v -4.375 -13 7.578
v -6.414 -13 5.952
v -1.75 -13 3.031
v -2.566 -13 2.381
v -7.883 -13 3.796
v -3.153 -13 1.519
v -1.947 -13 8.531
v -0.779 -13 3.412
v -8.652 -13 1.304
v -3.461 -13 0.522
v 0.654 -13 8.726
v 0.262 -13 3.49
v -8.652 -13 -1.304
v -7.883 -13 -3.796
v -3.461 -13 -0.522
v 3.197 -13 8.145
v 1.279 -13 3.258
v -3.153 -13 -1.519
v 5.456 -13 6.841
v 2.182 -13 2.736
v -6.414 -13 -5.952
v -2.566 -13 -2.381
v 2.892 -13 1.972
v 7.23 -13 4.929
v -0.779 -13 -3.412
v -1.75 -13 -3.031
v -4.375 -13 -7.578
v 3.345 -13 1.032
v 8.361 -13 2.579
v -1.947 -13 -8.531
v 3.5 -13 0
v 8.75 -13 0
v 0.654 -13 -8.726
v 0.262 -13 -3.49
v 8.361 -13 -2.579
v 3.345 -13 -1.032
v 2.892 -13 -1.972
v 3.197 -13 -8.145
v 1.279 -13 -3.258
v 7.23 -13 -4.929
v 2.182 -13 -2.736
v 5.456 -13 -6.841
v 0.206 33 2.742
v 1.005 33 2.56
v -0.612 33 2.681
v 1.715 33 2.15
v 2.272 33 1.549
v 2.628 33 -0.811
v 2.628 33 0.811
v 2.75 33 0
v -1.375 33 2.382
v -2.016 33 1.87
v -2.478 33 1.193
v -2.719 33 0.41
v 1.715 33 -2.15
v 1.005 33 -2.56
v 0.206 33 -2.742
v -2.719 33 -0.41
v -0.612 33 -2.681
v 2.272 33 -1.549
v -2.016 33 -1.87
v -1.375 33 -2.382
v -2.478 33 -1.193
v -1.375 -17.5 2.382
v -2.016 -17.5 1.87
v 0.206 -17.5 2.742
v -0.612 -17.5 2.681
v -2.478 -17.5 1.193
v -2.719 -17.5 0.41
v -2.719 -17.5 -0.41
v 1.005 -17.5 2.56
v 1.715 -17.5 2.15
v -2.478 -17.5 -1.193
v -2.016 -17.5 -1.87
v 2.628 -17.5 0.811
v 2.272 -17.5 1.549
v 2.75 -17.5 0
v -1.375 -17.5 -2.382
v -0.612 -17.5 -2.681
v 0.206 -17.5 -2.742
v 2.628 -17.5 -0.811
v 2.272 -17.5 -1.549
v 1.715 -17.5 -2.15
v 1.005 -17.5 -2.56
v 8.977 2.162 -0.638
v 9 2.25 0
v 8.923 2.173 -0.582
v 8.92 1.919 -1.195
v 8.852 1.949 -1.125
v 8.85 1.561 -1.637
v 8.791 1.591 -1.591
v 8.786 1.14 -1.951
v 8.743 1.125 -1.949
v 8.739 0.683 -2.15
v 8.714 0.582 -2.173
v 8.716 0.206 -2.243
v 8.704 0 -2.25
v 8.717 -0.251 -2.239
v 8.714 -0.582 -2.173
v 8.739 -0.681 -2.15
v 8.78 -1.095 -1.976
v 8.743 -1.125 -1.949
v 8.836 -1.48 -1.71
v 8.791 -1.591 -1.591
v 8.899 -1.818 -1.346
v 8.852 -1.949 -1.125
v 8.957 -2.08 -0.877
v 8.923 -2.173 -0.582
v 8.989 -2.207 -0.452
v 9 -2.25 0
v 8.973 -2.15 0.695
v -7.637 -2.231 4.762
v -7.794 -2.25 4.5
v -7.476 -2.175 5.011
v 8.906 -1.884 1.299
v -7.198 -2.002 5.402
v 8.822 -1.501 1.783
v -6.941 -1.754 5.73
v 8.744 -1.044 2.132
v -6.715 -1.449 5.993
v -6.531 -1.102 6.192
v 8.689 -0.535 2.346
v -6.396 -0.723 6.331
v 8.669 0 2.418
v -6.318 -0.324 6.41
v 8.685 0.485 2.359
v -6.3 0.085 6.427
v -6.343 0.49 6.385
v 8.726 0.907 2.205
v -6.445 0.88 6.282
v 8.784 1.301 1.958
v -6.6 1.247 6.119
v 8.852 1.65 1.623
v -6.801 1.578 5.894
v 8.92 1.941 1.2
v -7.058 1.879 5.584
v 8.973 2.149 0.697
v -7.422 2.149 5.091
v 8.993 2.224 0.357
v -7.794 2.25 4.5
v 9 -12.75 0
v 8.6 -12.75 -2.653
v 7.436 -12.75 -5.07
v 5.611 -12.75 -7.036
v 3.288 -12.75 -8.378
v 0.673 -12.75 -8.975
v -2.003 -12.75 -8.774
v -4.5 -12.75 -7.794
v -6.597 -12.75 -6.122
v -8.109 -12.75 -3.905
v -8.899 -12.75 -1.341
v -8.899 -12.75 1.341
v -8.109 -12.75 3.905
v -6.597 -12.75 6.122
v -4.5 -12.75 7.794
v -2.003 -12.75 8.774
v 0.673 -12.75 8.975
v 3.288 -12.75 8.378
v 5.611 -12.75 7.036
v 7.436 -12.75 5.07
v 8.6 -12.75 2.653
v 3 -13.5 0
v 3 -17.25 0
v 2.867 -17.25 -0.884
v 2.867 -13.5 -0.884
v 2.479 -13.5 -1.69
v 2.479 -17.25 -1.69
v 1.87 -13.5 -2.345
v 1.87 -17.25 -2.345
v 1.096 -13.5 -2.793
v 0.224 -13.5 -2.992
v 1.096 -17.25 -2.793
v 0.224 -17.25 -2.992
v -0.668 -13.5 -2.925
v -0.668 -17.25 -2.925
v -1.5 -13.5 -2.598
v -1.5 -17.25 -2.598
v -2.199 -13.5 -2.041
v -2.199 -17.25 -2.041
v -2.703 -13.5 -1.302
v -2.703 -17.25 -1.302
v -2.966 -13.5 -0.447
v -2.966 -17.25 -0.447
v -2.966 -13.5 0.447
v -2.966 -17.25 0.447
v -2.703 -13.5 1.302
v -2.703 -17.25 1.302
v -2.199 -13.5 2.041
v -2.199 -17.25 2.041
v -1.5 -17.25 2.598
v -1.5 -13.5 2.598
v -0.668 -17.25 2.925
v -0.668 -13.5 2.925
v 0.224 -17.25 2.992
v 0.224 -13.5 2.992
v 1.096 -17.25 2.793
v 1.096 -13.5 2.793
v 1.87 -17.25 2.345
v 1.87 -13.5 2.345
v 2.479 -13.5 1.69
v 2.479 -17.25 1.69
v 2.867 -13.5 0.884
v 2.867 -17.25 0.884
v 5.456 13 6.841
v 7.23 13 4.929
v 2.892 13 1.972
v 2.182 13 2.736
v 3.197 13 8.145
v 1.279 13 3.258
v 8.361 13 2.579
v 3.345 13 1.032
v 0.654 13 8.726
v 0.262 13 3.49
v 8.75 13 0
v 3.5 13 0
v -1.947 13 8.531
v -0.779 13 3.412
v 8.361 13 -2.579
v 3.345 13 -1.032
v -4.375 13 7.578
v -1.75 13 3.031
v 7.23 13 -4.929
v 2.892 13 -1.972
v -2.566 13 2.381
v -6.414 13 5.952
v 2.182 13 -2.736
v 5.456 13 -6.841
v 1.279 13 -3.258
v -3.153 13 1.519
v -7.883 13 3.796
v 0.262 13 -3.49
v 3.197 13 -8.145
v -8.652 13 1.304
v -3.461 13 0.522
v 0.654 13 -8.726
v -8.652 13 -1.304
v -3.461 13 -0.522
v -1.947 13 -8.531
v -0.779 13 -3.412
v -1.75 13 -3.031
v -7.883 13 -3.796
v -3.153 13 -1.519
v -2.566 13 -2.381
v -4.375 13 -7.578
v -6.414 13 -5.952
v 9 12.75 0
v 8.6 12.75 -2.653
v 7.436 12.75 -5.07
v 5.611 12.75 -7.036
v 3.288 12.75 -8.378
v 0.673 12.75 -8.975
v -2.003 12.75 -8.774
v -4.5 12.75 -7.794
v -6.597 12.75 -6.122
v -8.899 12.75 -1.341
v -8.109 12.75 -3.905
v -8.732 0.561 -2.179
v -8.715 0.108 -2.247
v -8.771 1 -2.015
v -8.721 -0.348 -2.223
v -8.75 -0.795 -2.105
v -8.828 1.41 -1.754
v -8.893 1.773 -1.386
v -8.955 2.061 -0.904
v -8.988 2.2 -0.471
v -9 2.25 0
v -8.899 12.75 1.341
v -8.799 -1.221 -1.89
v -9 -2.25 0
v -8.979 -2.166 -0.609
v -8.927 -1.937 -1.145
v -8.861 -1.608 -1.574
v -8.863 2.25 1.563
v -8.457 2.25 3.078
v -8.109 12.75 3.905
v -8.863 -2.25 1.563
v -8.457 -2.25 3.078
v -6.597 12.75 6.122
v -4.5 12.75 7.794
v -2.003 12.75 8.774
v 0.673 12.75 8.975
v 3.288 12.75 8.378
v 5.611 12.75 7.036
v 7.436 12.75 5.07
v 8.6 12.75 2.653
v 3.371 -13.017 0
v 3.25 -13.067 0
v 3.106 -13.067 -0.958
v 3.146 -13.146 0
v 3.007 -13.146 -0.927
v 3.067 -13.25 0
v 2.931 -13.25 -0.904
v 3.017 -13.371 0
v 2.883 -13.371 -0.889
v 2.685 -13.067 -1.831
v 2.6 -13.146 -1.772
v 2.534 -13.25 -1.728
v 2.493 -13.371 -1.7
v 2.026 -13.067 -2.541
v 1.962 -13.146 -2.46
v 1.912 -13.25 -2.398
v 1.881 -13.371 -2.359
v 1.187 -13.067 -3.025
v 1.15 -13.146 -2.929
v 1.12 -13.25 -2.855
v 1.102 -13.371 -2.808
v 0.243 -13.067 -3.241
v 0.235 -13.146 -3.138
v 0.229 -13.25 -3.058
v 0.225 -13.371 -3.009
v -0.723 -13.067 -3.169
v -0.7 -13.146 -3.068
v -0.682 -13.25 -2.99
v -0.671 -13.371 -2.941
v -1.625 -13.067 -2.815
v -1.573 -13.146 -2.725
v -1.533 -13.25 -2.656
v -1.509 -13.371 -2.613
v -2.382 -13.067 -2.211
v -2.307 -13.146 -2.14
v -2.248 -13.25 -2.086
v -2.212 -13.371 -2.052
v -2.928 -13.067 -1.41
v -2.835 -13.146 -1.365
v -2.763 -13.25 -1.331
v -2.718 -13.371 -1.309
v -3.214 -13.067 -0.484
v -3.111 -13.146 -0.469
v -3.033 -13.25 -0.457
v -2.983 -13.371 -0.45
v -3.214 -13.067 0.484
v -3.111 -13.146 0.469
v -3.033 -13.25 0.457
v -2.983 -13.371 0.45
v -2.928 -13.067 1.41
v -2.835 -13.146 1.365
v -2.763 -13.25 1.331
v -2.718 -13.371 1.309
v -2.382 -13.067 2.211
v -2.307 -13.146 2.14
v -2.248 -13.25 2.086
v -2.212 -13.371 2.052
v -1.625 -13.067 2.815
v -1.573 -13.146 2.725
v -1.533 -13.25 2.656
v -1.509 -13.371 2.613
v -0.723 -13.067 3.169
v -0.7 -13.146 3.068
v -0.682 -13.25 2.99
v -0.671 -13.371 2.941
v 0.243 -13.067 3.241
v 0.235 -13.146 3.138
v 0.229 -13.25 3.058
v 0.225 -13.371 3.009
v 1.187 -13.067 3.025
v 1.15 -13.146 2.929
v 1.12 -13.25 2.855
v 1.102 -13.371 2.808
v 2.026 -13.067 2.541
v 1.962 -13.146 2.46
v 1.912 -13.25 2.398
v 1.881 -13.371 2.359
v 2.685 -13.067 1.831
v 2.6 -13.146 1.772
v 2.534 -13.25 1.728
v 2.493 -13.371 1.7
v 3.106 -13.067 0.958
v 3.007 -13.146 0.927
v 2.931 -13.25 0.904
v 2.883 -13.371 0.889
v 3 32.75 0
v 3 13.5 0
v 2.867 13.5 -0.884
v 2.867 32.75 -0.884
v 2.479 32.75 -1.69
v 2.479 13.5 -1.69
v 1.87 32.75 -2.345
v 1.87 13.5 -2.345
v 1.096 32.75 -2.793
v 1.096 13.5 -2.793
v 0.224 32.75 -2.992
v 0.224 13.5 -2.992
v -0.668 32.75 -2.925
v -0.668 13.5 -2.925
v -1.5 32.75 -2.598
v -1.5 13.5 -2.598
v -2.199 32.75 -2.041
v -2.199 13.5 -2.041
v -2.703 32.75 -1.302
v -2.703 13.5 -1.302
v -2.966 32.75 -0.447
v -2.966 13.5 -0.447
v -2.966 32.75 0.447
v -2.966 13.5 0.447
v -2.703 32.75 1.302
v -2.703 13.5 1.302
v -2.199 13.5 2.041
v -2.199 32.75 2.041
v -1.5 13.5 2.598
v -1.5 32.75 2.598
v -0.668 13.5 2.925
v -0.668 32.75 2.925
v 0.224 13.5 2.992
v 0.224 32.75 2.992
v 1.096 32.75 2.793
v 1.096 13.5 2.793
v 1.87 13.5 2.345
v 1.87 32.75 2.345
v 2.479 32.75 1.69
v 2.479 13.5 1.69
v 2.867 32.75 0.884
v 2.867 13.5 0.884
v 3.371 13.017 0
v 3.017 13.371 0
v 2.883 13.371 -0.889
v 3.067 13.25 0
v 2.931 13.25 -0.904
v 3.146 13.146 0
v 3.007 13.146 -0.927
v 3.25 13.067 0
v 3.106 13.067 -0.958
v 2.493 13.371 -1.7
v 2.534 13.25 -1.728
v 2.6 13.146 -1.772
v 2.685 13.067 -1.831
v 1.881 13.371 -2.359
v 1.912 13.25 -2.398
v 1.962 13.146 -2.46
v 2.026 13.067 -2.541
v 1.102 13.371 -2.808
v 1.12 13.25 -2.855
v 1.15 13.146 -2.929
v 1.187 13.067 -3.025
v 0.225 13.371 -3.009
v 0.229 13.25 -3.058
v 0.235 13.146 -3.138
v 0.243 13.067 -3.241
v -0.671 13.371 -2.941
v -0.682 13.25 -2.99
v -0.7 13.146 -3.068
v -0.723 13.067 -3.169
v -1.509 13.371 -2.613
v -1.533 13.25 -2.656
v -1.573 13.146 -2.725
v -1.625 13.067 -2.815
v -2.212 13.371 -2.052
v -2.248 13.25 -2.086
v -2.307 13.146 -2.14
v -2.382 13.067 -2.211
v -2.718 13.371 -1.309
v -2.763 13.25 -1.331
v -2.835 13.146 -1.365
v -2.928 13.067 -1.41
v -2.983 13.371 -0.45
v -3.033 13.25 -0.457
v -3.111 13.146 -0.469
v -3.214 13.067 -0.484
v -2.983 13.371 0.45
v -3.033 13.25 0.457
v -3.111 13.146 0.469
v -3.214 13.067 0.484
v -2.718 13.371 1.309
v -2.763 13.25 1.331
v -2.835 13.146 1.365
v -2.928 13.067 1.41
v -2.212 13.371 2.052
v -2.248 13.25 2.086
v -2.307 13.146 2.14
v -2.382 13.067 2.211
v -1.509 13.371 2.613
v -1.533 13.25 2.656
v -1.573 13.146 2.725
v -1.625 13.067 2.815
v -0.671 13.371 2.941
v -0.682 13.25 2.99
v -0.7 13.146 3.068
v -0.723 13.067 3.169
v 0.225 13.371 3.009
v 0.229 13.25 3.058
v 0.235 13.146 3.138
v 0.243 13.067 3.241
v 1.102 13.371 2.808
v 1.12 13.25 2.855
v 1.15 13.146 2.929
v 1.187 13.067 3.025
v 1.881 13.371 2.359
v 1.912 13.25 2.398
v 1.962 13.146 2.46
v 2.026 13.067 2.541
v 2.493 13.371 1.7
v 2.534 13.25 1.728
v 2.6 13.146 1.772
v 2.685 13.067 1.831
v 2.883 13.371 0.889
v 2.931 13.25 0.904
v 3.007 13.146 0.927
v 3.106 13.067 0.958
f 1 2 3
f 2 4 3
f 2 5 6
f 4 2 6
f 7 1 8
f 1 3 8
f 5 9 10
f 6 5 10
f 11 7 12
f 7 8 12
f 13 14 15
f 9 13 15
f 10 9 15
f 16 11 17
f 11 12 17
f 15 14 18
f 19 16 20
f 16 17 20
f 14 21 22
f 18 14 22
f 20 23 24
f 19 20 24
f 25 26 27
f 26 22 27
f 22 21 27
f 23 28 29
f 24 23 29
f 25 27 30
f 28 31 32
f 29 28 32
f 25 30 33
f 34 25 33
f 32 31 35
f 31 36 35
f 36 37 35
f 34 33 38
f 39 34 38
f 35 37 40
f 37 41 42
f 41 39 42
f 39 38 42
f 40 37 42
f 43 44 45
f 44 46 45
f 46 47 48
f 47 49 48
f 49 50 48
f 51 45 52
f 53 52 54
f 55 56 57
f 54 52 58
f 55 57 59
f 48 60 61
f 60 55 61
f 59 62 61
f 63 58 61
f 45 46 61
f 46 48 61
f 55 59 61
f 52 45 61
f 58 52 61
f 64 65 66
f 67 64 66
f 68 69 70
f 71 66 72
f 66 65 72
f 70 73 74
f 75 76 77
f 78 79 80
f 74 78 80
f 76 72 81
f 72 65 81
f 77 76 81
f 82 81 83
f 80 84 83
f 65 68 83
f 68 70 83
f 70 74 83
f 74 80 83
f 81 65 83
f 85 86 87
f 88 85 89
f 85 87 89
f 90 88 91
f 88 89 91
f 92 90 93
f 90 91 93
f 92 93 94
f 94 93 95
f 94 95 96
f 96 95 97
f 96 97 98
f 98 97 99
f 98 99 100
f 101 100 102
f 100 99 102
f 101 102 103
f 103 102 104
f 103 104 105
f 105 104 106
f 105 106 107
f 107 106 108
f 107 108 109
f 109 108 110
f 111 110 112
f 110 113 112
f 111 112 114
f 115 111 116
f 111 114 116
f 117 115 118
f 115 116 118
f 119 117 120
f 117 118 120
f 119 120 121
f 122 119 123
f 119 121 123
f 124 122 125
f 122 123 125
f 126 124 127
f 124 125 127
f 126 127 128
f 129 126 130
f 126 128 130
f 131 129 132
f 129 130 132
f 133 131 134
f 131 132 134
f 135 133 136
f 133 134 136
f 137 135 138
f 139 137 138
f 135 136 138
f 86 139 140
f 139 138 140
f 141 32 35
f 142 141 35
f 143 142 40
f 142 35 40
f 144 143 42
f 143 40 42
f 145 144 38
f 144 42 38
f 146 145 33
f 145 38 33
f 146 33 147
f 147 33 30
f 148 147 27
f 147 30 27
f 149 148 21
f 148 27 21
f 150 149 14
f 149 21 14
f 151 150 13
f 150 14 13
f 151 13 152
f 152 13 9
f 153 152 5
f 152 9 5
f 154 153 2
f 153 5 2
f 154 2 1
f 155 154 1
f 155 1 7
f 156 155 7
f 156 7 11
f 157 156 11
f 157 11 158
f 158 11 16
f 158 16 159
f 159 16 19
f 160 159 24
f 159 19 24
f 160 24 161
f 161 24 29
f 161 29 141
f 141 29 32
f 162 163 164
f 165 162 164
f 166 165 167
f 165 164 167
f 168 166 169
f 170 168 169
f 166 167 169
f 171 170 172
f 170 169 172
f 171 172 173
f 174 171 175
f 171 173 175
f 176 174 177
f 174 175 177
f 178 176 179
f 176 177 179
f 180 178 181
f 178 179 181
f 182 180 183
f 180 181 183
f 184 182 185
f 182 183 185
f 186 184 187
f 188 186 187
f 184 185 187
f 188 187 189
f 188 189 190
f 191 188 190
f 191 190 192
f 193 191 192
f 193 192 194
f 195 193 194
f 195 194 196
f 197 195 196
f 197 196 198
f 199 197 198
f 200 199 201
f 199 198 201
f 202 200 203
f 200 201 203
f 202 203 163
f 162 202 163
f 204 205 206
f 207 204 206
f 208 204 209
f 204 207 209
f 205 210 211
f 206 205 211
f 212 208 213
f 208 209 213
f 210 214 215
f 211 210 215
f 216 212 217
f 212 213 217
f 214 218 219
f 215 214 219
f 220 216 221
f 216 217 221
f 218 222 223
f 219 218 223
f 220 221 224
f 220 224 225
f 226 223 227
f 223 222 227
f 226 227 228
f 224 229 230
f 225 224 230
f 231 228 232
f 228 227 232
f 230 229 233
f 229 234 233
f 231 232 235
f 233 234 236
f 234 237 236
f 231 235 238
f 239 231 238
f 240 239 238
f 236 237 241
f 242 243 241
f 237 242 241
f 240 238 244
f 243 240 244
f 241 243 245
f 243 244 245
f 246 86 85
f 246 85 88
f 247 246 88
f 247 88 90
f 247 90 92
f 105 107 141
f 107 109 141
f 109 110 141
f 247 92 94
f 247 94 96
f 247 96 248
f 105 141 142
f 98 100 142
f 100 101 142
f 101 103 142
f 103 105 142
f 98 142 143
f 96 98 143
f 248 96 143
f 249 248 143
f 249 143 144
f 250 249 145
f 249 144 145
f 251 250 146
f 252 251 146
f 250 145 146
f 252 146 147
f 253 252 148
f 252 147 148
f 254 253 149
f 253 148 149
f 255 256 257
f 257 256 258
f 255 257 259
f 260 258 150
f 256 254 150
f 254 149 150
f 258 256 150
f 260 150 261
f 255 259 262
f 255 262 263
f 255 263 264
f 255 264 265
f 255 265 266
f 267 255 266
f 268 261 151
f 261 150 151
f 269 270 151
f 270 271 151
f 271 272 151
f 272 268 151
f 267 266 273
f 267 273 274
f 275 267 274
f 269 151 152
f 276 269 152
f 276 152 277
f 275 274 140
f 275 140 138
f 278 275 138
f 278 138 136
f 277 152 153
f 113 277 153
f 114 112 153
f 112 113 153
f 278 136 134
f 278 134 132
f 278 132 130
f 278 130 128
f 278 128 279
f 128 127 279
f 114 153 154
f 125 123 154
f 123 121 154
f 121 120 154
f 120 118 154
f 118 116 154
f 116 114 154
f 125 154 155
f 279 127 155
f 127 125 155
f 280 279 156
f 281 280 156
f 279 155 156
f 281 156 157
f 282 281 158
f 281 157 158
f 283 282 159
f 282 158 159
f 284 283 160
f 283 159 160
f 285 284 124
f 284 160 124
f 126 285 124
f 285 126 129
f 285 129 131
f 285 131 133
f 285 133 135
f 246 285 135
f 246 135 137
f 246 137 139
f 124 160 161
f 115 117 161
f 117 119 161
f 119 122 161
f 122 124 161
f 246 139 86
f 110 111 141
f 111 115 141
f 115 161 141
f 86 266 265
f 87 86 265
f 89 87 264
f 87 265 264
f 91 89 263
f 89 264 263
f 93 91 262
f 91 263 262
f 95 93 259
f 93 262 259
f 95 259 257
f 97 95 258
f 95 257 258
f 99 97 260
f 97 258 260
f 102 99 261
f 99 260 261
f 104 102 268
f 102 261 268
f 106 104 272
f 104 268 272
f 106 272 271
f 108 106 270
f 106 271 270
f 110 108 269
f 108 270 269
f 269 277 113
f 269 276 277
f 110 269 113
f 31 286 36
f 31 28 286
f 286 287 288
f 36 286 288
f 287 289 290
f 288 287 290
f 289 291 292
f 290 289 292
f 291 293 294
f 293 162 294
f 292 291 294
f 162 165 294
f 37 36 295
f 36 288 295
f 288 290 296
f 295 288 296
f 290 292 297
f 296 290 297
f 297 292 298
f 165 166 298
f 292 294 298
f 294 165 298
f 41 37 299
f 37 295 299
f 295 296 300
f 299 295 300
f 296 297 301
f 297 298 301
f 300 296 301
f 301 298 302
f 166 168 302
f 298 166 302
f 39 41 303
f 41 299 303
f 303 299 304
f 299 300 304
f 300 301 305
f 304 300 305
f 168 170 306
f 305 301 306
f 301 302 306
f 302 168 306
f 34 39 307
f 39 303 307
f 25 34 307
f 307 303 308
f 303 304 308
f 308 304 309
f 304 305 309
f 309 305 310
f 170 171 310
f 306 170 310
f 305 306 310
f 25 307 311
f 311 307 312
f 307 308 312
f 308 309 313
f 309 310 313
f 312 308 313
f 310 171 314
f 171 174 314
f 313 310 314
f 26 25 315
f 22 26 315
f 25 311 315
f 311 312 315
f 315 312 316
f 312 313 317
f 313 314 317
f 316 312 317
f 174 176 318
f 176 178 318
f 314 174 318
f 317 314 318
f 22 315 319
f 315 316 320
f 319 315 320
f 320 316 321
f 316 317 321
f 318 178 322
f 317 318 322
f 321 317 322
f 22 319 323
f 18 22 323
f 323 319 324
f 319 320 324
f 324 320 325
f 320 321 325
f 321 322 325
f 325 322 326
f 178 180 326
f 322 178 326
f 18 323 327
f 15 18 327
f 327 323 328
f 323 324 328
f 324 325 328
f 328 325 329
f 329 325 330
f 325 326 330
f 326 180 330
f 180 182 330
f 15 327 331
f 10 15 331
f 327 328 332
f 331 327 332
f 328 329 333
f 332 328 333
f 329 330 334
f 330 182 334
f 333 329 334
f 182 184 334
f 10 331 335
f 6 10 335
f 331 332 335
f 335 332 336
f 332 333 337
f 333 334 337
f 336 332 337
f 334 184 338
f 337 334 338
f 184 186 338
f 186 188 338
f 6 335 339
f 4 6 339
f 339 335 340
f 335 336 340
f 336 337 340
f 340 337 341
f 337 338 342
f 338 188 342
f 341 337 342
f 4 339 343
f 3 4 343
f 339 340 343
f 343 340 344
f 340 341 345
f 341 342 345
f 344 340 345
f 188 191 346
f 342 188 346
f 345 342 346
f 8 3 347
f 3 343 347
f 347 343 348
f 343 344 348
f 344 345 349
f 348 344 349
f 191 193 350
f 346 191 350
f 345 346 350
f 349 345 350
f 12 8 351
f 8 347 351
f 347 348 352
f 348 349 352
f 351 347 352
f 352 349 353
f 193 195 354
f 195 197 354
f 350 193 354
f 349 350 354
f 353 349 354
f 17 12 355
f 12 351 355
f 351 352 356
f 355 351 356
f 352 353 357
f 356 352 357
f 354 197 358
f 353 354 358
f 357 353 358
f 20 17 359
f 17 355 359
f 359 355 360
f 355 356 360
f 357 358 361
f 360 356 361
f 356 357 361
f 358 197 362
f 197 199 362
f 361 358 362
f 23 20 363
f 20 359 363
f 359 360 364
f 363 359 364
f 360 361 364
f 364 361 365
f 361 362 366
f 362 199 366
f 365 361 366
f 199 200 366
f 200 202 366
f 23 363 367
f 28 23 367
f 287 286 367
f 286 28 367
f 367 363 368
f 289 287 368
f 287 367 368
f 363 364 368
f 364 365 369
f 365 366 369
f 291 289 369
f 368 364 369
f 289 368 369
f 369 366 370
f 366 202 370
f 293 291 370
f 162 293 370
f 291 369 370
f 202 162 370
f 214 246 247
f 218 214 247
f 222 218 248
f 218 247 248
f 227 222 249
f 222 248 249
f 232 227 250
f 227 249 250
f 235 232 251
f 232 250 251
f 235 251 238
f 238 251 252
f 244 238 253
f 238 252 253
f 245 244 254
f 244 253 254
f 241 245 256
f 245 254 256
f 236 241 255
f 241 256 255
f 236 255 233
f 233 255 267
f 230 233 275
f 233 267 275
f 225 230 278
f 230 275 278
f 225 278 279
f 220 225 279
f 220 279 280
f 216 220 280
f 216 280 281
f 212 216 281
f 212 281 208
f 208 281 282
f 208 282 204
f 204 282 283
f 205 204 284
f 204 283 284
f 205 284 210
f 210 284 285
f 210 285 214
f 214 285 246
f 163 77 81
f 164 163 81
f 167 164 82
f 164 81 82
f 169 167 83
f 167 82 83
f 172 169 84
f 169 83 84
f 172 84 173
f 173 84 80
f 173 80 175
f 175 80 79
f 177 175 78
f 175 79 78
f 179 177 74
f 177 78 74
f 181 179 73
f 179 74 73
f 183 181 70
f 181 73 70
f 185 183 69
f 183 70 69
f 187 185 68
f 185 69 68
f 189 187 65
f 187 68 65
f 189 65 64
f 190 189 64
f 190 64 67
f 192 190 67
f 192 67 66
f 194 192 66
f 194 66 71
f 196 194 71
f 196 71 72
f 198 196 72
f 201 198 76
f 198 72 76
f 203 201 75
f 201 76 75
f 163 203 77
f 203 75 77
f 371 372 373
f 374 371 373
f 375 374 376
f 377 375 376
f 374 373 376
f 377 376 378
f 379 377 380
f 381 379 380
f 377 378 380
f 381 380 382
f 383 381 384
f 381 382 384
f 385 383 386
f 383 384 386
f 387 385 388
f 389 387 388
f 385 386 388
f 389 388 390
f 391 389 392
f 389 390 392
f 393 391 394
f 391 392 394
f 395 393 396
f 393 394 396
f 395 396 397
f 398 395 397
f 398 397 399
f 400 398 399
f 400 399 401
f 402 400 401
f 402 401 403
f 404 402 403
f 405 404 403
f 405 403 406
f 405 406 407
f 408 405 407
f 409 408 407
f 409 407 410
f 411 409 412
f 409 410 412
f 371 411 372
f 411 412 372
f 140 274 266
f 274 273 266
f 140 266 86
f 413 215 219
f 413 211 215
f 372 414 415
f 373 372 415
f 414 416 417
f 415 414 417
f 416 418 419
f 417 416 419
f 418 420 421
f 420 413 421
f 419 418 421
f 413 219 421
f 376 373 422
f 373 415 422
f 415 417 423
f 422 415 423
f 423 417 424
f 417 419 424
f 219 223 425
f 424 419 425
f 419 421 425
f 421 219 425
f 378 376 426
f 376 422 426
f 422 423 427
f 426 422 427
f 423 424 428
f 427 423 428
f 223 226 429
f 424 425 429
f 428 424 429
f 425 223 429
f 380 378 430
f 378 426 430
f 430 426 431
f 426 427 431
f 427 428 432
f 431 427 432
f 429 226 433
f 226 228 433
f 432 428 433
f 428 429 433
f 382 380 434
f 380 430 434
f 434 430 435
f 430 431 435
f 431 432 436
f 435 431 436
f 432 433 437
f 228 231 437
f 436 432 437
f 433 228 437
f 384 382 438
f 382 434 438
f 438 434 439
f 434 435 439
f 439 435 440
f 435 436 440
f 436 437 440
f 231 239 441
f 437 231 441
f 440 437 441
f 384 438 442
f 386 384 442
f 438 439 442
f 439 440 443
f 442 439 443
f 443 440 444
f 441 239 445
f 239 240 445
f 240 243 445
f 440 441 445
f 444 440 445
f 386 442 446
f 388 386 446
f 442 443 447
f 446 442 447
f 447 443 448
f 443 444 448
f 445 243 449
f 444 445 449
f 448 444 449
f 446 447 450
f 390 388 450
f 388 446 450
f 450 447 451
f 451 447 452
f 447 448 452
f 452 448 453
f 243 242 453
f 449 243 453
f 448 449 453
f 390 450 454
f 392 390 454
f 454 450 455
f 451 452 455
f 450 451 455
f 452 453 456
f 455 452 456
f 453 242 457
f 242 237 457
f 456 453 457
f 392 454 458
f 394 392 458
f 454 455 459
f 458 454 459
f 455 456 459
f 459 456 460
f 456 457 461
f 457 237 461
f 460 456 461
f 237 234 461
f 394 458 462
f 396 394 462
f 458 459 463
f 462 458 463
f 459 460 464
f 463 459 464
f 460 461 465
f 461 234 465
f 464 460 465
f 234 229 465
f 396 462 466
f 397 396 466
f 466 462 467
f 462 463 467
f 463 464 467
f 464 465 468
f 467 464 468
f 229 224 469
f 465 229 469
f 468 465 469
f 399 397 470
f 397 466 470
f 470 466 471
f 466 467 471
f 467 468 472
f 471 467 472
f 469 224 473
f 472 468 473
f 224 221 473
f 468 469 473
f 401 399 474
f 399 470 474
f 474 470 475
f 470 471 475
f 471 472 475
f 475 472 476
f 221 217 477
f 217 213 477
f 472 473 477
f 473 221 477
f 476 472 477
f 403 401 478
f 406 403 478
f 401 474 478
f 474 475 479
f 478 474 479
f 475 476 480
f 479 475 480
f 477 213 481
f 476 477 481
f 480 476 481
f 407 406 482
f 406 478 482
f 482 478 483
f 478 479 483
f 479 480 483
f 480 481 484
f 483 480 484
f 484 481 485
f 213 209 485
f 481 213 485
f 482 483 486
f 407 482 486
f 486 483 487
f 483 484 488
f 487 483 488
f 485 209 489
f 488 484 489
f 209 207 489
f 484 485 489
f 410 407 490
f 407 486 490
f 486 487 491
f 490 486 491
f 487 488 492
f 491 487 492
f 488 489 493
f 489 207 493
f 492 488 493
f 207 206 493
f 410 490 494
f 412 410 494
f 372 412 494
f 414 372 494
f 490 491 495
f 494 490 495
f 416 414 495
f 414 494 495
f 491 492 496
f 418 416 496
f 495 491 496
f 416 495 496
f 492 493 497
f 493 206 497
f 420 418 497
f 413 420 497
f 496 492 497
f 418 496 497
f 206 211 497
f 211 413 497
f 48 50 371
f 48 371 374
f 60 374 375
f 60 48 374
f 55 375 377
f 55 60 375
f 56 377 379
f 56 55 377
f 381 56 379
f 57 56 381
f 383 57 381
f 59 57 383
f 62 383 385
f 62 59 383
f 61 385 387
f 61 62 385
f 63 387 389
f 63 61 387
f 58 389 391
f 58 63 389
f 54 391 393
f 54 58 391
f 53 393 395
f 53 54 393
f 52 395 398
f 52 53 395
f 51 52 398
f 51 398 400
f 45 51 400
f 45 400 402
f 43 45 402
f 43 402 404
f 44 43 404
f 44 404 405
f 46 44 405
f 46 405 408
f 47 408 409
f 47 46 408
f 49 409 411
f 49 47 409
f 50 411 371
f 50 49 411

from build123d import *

# Parameters (mm, degrees)
ESBO_O2_R                  = 2.25
CORTE_EXTRUS_O2_DEPTH      = 19
ESBO_O7_R                  = 2.25
CORTE_EXTRUS_O6_DEPTH      = 3.329371528
CORTE_EXTRUS_O6_DEPTH_BACK = 20.716036402
CUT_EXTRUDE1_DEPTH         = 2.25
FILLET1_R                  = 0.5
CHAMFER1_SIZE              = 0.25
CHAMFER4_SIZE              = 0.25


with BuildPart() as part:
    # Esboço1 → Revolução1 (revolve)
    with BuildSketch(Plane.XY):
        Polygon((0, 33), (3, 33), (3, 13), (9, 13), (9, -13), (3, -13), (3, -17.5), (0, -17.5), (0, 0), align=None)
    revolve(axis=Axis((0, 0, 0), (0, 1, 0)))

    # Esboço2 → Corte-extrusão2 (cut, through all)
    with BuildSketch(Plane.ZY.offset(9)):
        Circle(ESBO_O2_R)
    extrude(amount=-CORTE_EXTRUS_O2_DEPTH, mode=Mode.SUBTRACT)

    # Esboço7 → Corte-extrusão6 (cut, two sides)
    with BuildSketch(Plane(origin=(-7.794228634, 0, 4.5), x_dir=(0.258819045, 0, 0.965925826), z_dir=(-0.965925826, 0, 0.258819045))) as corte_extrus_o6_sk:
        Circle(ESBO_O7_R)
    extrude(amount=CORTE_EXTRUS_O6_DEPTH, mode=Mode.SUBTRACT)
    extrude(corte_extrus_o6_sk.sketch, amount=-CORTE_EXTRUS_O6_DEPTH_BACK, mode=Mode.SUBTRACT)

    # Sketch1 → Cut-Extrude1 (cut, symmetric)
    with BuildSketch(Plane(origin=(0, 0, 0), x_dir=(1, 0, 0), z_dir=(0, 1, 0))):
        Polygon((9, 0), (-10.844388007, 0), (-10.42876147, -5.205920946), align=None)
    extrude(amount=CUT_EXTRUDE1_DEPTH, both=True, mode=Mode.SUBTRACT)

    # Fillet1
    fillet1_edges = [part.edges().sort_by_distance(p)[0] for p in [
        (-3, -13, 0),
        (-3, 13, 0),
    ]]
    fillet(fillet1_edges, radius=FILLET1_R)

    # Chamfer1
    chamfer1_edges = [part.edges().sort_by_distance(p)[0] for p in [
        (-3, -17.5, 0),
        (-3, 33, 0),
    ]]
    chamfer(chamfer1_edges, length=CHAMFER1_SIZE)

    # Chamfer4
    chamfer4_edges = [part.edges().sort_by_distance(p)[0] for p in [
        (-9, -13, 0),
        (-9, 13, 0),
    ]]
    chamfer(chamfer4_edges, length=CHAMFER4_SIZE)


solid = part.part
